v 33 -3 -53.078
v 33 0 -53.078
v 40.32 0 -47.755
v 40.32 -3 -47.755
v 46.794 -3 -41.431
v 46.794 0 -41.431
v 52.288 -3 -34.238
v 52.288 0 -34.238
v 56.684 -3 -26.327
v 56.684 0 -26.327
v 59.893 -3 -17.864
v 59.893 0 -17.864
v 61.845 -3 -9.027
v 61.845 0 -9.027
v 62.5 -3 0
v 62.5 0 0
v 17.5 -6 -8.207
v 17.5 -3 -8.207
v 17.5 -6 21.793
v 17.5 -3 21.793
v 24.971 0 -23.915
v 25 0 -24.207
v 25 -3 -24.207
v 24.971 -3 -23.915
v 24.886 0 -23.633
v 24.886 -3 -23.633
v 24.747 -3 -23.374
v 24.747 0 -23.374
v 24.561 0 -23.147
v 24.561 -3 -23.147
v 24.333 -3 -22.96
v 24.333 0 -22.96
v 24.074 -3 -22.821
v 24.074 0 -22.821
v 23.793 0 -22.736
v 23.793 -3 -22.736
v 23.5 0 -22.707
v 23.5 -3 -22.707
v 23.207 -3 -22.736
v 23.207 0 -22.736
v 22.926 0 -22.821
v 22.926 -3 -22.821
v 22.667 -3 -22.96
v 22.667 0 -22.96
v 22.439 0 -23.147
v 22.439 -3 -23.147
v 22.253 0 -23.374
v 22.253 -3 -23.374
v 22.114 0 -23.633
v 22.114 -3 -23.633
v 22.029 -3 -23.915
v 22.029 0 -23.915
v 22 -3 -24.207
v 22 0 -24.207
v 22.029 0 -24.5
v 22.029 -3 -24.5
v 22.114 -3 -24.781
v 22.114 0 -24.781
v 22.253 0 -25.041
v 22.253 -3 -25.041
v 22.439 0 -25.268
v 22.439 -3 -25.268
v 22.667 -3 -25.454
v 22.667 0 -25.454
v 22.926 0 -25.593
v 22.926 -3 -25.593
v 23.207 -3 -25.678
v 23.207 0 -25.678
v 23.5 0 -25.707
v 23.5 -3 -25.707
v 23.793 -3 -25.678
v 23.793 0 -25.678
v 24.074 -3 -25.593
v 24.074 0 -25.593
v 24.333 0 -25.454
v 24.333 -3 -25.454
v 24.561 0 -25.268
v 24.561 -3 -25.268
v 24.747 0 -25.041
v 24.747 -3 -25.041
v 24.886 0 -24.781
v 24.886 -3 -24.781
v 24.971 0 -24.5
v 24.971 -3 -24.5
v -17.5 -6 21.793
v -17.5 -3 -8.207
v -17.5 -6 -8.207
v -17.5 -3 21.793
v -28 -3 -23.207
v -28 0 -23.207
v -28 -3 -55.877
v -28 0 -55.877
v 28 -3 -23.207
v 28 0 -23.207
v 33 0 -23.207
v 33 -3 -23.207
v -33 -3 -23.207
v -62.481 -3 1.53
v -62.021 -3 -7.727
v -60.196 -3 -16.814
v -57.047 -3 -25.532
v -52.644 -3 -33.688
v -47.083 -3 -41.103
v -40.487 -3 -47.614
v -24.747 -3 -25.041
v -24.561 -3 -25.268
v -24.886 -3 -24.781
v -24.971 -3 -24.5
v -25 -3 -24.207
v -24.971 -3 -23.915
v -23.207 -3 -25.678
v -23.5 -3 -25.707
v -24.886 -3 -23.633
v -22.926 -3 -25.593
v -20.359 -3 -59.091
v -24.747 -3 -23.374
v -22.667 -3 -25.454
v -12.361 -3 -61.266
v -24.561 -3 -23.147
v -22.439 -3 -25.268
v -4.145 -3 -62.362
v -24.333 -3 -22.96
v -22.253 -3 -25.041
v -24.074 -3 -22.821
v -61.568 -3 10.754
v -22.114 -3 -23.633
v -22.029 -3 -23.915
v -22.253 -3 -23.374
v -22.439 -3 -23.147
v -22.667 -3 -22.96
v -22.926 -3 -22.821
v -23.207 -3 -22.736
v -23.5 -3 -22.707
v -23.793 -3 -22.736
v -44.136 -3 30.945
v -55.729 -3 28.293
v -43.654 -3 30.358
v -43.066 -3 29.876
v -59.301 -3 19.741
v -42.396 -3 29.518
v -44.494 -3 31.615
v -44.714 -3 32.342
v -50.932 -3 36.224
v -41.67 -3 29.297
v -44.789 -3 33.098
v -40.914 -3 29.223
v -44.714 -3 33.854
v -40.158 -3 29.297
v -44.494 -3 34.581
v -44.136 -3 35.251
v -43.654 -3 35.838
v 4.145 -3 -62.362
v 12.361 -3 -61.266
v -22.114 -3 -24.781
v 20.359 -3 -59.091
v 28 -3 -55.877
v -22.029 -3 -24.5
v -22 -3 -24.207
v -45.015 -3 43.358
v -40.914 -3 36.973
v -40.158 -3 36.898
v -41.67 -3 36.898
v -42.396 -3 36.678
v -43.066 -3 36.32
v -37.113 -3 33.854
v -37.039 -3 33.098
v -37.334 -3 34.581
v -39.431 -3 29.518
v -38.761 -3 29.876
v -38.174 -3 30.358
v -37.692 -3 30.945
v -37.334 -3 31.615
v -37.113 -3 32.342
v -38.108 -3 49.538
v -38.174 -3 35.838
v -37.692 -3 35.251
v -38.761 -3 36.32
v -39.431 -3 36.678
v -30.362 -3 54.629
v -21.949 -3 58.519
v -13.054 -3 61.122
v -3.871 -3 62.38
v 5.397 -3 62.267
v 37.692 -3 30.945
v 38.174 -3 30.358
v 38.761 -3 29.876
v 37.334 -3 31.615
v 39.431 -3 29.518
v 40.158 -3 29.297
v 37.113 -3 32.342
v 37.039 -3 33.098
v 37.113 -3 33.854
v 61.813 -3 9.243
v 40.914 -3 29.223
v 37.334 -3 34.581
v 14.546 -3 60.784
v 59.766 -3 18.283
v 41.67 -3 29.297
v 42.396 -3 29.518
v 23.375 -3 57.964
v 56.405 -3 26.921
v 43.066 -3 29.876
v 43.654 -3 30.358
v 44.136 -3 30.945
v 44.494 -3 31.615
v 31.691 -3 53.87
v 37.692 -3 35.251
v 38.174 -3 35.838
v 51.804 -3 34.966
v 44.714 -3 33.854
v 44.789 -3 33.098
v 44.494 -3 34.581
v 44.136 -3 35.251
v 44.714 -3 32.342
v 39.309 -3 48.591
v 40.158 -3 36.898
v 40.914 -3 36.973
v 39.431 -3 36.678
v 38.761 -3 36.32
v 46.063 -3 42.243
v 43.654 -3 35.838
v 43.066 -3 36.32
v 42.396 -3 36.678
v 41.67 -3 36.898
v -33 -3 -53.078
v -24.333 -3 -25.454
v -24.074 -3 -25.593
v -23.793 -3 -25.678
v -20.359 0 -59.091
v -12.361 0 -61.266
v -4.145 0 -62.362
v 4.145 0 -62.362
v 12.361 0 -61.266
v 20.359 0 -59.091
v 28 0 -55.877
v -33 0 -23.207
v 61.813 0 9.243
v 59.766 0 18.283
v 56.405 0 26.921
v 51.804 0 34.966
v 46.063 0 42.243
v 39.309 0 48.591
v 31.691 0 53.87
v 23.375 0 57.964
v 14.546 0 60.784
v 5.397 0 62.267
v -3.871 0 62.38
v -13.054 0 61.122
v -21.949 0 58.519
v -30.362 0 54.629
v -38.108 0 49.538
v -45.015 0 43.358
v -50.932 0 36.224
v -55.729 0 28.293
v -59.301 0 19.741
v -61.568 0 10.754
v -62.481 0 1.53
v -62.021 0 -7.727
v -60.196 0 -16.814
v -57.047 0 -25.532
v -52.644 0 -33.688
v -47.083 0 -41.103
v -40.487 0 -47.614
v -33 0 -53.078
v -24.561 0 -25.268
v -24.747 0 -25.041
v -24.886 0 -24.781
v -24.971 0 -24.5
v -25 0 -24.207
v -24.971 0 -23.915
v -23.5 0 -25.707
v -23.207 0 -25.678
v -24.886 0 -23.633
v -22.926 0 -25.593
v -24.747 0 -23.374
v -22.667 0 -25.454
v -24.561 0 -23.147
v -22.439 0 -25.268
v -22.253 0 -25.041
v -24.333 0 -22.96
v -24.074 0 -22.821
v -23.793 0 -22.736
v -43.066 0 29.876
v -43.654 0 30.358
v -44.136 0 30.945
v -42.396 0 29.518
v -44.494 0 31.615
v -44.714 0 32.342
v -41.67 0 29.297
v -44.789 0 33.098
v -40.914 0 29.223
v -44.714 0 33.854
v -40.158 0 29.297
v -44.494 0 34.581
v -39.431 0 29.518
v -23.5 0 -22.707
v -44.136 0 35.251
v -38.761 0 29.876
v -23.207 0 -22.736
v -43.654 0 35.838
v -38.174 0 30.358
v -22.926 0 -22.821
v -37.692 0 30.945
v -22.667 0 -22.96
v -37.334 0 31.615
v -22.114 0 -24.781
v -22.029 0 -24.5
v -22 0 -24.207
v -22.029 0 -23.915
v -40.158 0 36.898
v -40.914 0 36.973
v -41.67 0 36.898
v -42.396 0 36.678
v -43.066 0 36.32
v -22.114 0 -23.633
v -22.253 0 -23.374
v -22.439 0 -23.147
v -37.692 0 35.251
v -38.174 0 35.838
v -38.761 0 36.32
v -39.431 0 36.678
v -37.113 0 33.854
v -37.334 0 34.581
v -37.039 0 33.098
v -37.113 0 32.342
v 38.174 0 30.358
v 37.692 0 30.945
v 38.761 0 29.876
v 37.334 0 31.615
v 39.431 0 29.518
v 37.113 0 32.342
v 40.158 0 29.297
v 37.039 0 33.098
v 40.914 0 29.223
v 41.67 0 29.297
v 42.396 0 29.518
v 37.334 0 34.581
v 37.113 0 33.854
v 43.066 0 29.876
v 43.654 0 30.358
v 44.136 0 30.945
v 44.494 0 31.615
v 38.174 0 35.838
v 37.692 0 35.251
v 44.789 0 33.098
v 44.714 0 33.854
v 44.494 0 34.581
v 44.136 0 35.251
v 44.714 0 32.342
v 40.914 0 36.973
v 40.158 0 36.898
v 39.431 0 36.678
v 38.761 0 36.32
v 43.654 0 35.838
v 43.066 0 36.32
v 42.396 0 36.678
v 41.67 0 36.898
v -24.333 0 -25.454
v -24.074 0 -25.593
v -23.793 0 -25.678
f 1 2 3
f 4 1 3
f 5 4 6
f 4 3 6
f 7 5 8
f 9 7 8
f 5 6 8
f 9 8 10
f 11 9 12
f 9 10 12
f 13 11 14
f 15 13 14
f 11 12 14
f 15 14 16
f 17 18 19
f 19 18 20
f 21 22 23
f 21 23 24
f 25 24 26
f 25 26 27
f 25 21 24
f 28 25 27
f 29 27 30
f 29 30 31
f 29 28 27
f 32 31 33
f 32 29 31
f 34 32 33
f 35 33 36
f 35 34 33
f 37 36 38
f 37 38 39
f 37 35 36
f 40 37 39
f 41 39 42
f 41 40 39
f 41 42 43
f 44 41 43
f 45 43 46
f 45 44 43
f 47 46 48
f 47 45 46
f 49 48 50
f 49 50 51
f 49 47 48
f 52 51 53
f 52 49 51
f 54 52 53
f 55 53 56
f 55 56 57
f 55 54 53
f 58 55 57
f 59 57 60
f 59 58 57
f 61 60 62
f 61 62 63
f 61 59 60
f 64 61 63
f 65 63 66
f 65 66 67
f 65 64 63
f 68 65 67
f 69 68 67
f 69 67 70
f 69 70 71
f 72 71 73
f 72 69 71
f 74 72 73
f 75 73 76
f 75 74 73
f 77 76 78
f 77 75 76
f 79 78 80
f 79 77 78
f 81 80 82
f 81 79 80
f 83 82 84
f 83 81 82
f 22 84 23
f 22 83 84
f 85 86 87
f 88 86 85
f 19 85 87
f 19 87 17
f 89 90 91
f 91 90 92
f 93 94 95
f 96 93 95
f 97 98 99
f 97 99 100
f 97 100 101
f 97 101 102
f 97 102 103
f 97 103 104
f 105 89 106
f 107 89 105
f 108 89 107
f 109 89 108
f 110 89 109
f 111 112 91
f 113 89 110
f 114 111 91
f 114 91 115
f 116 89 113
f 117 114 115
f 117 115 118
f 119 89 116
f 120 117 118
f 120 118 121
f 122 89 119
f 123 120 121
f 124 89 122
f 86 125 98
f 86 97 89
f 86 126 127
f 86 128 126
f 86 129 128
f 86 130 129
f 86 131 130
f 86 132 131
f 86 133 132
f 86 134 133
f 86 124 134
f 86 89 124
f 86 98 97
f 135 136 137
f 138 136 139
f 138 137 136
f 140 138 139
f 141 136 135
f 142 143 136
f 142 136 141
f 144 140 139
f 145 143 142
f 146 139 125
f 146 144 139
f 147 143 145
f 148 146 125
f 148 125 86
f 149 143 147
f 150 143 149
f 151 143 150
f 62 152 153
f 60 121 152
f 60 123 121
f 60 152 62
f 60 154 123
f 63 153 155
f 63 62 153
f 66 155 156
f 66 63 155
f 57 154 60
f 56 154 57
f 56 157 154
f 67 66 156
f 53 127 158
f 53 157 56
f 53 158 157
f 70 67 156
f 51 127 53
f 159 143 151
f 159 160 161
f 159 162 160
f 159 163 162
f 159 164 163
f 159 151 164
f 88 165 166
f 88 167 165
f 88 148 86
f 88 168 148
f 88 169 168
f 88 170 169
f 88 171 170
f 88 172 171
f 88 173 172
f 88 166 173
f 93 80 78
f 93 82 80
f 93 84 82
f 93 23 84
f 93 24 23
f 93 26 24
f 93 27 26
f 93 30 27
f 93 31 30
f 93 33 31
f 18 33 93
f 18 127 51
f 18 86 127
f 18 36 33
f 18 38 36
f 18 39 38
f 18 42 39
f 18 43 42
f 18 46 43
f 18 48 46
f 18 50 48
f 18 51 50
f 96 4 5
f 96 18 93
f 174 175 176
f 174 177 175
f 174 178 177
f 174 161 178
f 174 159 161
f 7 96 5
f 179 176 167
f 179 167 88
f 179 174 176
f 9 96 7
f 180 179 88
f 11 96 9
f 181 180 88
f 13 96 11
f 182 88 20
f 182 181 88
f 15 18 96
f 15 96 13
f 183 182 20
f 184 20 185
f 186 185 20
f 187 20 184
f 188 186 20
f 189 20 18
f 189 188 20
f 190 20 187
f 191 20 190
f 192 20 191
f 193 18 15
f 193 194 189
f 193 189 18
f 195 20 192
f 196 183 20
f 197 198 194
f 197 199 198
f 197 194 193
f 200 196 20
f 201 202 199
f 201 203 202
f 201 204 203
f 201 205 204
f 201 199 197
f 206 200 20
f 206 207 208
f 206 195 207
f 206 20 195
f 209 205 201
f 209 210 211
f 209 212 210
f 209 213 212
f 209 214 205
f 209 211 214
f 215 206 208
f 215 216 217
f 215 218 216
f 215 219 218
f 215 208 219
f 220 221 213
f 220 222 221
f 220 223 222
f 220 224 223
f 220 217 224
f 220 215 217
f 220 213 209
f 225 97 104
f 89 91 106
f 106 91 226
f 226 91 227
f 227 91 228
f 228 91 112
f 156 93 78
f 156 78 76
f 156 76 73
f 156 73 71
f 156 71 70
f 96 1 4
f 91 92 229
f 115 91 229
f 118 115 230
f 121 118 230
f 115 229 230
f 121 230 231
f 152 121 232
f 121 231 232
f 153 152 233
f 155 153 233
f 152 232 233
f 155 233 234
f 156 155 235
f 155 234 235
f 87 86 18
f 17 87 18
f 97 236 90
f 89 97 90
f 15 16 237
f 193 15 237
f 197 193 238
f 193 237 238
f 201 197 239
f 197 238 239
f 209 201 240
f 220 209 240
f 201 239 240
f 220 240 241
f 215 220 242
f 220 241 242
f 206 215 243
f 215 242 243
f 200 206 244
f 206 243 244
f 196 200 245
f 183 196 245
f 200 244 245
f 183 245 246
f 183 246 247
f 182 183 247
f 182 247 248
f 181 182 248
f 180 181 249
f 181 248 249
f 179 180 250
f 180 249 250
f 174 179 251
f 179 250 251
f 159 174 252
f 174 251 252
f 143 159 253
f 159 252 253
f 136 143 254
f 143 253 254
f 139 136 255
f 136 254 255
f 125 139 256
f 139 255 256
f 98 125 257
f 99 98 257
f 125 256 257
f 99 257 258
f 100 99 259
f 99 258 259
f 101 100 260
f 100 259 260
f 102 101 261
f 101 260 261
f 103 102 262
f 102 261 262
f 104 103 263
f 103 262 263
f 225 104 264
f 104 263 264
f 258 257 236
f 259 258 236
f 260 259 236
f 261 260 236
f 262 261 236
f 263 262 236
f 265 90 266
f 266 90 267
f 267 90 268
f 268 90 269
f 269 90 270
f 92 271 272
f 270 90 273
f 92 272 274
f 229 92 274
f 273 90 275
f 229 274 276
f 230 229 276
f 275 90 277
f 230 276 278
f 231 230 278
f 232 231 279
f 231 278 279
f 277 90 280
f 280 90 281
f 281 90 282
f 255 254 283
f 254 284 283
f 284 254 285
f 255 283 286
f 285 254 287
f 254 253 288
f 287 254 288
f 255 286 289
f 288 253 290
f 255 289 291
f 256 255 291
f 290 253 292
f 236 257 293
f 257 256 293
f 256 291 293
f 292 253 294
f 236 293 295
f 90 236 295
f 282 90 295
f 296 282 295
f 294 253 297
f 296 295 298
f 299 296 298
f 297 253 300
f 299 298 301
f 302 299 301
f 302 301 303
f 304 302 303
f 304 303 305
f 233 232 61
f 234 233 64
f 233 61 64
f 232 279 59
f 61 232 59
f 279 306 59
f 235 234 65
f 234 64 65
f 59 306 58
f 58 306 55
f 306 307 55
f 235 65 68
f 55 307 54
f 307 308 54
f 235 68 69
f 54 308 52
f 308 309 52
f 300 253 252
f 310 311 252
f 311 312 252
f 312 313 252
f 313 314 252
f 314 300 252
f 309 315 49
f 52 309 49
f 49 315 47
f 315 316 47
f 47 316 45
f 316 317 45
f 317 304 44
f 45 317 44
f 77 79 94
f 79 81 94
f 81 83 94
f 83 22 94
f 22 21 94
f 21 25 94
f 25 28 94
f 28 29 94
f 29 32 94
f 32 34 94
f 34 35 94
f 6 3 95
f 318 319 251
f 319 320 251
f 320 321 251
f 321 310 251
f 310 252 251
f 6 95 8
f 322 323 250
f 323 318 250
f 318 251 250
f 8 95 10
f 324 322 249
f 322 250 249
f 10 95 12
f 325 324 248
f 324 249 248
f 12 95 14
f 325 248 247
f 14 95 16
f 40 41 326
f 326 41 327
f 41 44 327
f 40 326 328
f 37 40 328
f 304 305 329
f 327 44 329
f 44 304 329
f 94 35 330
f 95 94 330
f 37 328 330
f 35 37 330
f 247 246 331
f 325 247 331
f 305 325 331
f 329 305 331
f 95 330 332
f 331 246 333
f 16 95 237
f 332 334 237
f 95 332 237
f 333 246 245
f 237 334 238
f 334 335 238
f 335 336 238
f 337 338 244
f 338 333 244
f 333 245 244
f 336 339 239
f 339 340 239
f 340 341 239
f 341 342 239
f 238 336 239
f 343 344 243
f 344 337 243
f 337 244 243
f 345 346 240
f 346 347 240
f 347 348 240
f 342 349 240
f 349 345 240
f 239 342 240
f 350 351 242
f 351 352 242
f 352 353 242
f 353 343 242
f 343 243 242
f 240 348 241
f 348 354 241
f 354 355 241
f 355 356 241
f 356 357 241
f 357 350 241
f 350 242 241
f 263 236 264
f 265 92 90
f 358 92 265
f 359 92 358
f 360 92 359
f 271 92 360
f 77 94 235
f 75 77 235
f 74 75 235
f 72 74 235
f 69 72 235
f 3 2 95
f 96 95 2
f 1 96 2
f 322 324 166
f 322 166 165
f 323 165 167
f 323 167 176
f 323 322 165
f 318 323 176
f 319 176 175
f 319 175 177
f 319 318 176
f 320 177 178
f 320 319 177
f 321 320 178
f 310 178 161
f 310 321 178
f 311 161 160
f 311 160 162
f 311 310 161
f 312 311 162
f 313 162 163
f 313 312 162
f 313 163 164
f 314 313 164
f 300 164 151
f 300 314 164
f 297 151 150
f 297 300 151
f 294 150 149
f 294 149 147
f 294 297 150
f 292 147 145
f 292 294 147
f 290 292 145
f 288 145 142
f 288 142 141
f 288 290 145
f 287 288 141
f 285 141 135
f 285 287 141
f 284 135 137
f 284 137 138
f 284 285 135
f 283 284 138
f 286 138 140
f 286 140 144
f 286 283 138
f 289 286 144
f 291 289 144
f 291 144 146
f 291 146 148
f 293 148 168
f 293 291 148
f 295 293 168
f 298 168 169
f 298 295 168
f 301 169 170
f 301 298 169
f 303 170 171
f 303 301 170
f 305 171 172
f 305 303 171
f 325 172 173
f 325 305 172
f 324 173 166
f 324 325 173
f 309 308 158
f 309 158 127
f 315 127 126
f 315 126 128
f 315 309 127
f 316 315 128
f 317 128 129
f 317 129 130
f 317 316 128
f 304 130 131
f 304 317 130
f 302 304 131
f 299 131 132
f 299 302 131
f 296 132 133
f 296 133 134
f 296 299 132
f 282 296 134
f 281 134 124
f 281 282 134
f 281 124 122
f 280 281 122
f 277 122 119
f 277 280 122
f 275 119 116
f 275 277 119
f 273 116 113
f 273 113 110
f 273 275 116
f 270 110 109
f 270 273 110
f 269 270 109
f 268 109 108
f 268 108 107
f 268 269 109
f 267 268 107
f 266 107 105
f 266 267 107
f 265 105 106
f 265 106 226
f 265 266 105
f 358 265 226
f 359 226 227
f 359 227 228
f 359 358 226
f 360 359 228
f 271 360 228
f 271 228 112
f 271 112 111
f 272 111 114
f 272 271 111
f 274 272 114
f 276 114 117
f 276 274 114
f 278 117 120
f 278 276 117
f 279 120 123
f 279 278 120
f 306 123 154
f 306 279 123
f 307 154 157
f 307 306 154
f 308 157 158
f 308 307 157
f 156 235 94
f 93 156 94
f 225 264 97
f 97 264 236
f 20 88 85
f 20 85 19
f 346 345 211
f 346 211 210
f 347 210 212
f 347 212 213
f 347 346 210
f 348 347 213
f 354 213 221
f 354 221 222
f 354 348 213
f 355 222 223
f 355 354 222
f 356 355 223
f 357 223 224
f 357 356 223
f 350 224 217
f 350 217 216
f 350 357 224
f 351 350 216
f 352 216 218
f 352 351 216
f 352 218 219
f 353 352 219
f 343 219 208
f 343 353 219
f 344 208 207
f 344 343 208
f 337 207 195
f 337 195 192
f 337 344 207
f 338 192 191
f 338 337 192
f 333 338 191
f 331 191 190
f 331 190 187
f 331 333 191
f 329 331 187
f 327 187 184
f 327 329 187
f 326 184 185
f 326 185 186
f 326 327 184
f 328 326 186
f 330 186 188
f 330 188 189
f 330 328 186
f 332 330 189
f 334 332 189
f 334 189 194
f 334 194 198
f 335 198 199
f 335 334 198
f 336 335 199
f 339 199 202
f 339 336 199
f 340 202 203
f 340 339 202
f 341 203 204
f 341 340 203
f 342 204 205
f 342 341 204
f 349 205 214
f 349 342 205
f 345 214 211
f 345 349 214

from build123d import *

# Parameters (mm, degrees)
F0_R     = 1.5
F0_R_2   = 3.875
F0_W     = 35
F0_H     = 30
F1_DEPTH = 3
F2_DEPTH = 6


with BuildPart() as f1:
    # F0 (on Front) → F1 (new body)
    with BuildSketch(Plane.XZ):
        with BuildLine():
            ThreePointArc((33, -53.077773), (54.629433, -30.362395), (62.5, 0))
            ThreePointArc((62.5, 0), (-30.362395, 54.629433), (-33, -53.077773))
            Line((-33, -53.077773), (-33, -23.207187))
            Line((-33, -23.207187), (-28, -23.207187))
            Line((-28, -23.207187), (-28, -55.877097))
            ThreePointArc((-28, -55.877097), (0, -62.5), (28, -55.877097))
            Line((28, -55.877097), (28, -23.207187))
            Line((28, -23.207187), (33, -23.207187))
            Line((33, -23.207187), (33, -53.077773))
        make_face()
        with Locations((-23.5, -24.207187)):
            Circle(F0_R, mode=Mode.SUBTRACT)
        with Locations((23.5, -24.207187)):
            Circle(F0_R, mode=Mode.SUBTRACT)
        with Locations((-40.913567, 33.097895)):
            Circle(F0_R_2, mode=Mode.SUBTRACT)
        with Locations((0, 6.792813)):
            Rectangle(F0_W, F0_H, mode=Mode.SUBTRACT)
        with Locations((40.913567, 33.097895)):
            Circle(F0_R_2, mode=Mode.SUBTRACT)
        with Locations((0, 6.792813)):
            Rectangle(F0_W, F0_H)
    extrude(amount=F1_DEPTH)

    # F0 (on Front) → F2 (join)
    with BuildSketch(Plane.XZ):
        with Locations((0, 6.792813)):
            Rectangle(F0_W, F0_H)
    extrude(amount=F2_DEPTH)


solid = f1.part
